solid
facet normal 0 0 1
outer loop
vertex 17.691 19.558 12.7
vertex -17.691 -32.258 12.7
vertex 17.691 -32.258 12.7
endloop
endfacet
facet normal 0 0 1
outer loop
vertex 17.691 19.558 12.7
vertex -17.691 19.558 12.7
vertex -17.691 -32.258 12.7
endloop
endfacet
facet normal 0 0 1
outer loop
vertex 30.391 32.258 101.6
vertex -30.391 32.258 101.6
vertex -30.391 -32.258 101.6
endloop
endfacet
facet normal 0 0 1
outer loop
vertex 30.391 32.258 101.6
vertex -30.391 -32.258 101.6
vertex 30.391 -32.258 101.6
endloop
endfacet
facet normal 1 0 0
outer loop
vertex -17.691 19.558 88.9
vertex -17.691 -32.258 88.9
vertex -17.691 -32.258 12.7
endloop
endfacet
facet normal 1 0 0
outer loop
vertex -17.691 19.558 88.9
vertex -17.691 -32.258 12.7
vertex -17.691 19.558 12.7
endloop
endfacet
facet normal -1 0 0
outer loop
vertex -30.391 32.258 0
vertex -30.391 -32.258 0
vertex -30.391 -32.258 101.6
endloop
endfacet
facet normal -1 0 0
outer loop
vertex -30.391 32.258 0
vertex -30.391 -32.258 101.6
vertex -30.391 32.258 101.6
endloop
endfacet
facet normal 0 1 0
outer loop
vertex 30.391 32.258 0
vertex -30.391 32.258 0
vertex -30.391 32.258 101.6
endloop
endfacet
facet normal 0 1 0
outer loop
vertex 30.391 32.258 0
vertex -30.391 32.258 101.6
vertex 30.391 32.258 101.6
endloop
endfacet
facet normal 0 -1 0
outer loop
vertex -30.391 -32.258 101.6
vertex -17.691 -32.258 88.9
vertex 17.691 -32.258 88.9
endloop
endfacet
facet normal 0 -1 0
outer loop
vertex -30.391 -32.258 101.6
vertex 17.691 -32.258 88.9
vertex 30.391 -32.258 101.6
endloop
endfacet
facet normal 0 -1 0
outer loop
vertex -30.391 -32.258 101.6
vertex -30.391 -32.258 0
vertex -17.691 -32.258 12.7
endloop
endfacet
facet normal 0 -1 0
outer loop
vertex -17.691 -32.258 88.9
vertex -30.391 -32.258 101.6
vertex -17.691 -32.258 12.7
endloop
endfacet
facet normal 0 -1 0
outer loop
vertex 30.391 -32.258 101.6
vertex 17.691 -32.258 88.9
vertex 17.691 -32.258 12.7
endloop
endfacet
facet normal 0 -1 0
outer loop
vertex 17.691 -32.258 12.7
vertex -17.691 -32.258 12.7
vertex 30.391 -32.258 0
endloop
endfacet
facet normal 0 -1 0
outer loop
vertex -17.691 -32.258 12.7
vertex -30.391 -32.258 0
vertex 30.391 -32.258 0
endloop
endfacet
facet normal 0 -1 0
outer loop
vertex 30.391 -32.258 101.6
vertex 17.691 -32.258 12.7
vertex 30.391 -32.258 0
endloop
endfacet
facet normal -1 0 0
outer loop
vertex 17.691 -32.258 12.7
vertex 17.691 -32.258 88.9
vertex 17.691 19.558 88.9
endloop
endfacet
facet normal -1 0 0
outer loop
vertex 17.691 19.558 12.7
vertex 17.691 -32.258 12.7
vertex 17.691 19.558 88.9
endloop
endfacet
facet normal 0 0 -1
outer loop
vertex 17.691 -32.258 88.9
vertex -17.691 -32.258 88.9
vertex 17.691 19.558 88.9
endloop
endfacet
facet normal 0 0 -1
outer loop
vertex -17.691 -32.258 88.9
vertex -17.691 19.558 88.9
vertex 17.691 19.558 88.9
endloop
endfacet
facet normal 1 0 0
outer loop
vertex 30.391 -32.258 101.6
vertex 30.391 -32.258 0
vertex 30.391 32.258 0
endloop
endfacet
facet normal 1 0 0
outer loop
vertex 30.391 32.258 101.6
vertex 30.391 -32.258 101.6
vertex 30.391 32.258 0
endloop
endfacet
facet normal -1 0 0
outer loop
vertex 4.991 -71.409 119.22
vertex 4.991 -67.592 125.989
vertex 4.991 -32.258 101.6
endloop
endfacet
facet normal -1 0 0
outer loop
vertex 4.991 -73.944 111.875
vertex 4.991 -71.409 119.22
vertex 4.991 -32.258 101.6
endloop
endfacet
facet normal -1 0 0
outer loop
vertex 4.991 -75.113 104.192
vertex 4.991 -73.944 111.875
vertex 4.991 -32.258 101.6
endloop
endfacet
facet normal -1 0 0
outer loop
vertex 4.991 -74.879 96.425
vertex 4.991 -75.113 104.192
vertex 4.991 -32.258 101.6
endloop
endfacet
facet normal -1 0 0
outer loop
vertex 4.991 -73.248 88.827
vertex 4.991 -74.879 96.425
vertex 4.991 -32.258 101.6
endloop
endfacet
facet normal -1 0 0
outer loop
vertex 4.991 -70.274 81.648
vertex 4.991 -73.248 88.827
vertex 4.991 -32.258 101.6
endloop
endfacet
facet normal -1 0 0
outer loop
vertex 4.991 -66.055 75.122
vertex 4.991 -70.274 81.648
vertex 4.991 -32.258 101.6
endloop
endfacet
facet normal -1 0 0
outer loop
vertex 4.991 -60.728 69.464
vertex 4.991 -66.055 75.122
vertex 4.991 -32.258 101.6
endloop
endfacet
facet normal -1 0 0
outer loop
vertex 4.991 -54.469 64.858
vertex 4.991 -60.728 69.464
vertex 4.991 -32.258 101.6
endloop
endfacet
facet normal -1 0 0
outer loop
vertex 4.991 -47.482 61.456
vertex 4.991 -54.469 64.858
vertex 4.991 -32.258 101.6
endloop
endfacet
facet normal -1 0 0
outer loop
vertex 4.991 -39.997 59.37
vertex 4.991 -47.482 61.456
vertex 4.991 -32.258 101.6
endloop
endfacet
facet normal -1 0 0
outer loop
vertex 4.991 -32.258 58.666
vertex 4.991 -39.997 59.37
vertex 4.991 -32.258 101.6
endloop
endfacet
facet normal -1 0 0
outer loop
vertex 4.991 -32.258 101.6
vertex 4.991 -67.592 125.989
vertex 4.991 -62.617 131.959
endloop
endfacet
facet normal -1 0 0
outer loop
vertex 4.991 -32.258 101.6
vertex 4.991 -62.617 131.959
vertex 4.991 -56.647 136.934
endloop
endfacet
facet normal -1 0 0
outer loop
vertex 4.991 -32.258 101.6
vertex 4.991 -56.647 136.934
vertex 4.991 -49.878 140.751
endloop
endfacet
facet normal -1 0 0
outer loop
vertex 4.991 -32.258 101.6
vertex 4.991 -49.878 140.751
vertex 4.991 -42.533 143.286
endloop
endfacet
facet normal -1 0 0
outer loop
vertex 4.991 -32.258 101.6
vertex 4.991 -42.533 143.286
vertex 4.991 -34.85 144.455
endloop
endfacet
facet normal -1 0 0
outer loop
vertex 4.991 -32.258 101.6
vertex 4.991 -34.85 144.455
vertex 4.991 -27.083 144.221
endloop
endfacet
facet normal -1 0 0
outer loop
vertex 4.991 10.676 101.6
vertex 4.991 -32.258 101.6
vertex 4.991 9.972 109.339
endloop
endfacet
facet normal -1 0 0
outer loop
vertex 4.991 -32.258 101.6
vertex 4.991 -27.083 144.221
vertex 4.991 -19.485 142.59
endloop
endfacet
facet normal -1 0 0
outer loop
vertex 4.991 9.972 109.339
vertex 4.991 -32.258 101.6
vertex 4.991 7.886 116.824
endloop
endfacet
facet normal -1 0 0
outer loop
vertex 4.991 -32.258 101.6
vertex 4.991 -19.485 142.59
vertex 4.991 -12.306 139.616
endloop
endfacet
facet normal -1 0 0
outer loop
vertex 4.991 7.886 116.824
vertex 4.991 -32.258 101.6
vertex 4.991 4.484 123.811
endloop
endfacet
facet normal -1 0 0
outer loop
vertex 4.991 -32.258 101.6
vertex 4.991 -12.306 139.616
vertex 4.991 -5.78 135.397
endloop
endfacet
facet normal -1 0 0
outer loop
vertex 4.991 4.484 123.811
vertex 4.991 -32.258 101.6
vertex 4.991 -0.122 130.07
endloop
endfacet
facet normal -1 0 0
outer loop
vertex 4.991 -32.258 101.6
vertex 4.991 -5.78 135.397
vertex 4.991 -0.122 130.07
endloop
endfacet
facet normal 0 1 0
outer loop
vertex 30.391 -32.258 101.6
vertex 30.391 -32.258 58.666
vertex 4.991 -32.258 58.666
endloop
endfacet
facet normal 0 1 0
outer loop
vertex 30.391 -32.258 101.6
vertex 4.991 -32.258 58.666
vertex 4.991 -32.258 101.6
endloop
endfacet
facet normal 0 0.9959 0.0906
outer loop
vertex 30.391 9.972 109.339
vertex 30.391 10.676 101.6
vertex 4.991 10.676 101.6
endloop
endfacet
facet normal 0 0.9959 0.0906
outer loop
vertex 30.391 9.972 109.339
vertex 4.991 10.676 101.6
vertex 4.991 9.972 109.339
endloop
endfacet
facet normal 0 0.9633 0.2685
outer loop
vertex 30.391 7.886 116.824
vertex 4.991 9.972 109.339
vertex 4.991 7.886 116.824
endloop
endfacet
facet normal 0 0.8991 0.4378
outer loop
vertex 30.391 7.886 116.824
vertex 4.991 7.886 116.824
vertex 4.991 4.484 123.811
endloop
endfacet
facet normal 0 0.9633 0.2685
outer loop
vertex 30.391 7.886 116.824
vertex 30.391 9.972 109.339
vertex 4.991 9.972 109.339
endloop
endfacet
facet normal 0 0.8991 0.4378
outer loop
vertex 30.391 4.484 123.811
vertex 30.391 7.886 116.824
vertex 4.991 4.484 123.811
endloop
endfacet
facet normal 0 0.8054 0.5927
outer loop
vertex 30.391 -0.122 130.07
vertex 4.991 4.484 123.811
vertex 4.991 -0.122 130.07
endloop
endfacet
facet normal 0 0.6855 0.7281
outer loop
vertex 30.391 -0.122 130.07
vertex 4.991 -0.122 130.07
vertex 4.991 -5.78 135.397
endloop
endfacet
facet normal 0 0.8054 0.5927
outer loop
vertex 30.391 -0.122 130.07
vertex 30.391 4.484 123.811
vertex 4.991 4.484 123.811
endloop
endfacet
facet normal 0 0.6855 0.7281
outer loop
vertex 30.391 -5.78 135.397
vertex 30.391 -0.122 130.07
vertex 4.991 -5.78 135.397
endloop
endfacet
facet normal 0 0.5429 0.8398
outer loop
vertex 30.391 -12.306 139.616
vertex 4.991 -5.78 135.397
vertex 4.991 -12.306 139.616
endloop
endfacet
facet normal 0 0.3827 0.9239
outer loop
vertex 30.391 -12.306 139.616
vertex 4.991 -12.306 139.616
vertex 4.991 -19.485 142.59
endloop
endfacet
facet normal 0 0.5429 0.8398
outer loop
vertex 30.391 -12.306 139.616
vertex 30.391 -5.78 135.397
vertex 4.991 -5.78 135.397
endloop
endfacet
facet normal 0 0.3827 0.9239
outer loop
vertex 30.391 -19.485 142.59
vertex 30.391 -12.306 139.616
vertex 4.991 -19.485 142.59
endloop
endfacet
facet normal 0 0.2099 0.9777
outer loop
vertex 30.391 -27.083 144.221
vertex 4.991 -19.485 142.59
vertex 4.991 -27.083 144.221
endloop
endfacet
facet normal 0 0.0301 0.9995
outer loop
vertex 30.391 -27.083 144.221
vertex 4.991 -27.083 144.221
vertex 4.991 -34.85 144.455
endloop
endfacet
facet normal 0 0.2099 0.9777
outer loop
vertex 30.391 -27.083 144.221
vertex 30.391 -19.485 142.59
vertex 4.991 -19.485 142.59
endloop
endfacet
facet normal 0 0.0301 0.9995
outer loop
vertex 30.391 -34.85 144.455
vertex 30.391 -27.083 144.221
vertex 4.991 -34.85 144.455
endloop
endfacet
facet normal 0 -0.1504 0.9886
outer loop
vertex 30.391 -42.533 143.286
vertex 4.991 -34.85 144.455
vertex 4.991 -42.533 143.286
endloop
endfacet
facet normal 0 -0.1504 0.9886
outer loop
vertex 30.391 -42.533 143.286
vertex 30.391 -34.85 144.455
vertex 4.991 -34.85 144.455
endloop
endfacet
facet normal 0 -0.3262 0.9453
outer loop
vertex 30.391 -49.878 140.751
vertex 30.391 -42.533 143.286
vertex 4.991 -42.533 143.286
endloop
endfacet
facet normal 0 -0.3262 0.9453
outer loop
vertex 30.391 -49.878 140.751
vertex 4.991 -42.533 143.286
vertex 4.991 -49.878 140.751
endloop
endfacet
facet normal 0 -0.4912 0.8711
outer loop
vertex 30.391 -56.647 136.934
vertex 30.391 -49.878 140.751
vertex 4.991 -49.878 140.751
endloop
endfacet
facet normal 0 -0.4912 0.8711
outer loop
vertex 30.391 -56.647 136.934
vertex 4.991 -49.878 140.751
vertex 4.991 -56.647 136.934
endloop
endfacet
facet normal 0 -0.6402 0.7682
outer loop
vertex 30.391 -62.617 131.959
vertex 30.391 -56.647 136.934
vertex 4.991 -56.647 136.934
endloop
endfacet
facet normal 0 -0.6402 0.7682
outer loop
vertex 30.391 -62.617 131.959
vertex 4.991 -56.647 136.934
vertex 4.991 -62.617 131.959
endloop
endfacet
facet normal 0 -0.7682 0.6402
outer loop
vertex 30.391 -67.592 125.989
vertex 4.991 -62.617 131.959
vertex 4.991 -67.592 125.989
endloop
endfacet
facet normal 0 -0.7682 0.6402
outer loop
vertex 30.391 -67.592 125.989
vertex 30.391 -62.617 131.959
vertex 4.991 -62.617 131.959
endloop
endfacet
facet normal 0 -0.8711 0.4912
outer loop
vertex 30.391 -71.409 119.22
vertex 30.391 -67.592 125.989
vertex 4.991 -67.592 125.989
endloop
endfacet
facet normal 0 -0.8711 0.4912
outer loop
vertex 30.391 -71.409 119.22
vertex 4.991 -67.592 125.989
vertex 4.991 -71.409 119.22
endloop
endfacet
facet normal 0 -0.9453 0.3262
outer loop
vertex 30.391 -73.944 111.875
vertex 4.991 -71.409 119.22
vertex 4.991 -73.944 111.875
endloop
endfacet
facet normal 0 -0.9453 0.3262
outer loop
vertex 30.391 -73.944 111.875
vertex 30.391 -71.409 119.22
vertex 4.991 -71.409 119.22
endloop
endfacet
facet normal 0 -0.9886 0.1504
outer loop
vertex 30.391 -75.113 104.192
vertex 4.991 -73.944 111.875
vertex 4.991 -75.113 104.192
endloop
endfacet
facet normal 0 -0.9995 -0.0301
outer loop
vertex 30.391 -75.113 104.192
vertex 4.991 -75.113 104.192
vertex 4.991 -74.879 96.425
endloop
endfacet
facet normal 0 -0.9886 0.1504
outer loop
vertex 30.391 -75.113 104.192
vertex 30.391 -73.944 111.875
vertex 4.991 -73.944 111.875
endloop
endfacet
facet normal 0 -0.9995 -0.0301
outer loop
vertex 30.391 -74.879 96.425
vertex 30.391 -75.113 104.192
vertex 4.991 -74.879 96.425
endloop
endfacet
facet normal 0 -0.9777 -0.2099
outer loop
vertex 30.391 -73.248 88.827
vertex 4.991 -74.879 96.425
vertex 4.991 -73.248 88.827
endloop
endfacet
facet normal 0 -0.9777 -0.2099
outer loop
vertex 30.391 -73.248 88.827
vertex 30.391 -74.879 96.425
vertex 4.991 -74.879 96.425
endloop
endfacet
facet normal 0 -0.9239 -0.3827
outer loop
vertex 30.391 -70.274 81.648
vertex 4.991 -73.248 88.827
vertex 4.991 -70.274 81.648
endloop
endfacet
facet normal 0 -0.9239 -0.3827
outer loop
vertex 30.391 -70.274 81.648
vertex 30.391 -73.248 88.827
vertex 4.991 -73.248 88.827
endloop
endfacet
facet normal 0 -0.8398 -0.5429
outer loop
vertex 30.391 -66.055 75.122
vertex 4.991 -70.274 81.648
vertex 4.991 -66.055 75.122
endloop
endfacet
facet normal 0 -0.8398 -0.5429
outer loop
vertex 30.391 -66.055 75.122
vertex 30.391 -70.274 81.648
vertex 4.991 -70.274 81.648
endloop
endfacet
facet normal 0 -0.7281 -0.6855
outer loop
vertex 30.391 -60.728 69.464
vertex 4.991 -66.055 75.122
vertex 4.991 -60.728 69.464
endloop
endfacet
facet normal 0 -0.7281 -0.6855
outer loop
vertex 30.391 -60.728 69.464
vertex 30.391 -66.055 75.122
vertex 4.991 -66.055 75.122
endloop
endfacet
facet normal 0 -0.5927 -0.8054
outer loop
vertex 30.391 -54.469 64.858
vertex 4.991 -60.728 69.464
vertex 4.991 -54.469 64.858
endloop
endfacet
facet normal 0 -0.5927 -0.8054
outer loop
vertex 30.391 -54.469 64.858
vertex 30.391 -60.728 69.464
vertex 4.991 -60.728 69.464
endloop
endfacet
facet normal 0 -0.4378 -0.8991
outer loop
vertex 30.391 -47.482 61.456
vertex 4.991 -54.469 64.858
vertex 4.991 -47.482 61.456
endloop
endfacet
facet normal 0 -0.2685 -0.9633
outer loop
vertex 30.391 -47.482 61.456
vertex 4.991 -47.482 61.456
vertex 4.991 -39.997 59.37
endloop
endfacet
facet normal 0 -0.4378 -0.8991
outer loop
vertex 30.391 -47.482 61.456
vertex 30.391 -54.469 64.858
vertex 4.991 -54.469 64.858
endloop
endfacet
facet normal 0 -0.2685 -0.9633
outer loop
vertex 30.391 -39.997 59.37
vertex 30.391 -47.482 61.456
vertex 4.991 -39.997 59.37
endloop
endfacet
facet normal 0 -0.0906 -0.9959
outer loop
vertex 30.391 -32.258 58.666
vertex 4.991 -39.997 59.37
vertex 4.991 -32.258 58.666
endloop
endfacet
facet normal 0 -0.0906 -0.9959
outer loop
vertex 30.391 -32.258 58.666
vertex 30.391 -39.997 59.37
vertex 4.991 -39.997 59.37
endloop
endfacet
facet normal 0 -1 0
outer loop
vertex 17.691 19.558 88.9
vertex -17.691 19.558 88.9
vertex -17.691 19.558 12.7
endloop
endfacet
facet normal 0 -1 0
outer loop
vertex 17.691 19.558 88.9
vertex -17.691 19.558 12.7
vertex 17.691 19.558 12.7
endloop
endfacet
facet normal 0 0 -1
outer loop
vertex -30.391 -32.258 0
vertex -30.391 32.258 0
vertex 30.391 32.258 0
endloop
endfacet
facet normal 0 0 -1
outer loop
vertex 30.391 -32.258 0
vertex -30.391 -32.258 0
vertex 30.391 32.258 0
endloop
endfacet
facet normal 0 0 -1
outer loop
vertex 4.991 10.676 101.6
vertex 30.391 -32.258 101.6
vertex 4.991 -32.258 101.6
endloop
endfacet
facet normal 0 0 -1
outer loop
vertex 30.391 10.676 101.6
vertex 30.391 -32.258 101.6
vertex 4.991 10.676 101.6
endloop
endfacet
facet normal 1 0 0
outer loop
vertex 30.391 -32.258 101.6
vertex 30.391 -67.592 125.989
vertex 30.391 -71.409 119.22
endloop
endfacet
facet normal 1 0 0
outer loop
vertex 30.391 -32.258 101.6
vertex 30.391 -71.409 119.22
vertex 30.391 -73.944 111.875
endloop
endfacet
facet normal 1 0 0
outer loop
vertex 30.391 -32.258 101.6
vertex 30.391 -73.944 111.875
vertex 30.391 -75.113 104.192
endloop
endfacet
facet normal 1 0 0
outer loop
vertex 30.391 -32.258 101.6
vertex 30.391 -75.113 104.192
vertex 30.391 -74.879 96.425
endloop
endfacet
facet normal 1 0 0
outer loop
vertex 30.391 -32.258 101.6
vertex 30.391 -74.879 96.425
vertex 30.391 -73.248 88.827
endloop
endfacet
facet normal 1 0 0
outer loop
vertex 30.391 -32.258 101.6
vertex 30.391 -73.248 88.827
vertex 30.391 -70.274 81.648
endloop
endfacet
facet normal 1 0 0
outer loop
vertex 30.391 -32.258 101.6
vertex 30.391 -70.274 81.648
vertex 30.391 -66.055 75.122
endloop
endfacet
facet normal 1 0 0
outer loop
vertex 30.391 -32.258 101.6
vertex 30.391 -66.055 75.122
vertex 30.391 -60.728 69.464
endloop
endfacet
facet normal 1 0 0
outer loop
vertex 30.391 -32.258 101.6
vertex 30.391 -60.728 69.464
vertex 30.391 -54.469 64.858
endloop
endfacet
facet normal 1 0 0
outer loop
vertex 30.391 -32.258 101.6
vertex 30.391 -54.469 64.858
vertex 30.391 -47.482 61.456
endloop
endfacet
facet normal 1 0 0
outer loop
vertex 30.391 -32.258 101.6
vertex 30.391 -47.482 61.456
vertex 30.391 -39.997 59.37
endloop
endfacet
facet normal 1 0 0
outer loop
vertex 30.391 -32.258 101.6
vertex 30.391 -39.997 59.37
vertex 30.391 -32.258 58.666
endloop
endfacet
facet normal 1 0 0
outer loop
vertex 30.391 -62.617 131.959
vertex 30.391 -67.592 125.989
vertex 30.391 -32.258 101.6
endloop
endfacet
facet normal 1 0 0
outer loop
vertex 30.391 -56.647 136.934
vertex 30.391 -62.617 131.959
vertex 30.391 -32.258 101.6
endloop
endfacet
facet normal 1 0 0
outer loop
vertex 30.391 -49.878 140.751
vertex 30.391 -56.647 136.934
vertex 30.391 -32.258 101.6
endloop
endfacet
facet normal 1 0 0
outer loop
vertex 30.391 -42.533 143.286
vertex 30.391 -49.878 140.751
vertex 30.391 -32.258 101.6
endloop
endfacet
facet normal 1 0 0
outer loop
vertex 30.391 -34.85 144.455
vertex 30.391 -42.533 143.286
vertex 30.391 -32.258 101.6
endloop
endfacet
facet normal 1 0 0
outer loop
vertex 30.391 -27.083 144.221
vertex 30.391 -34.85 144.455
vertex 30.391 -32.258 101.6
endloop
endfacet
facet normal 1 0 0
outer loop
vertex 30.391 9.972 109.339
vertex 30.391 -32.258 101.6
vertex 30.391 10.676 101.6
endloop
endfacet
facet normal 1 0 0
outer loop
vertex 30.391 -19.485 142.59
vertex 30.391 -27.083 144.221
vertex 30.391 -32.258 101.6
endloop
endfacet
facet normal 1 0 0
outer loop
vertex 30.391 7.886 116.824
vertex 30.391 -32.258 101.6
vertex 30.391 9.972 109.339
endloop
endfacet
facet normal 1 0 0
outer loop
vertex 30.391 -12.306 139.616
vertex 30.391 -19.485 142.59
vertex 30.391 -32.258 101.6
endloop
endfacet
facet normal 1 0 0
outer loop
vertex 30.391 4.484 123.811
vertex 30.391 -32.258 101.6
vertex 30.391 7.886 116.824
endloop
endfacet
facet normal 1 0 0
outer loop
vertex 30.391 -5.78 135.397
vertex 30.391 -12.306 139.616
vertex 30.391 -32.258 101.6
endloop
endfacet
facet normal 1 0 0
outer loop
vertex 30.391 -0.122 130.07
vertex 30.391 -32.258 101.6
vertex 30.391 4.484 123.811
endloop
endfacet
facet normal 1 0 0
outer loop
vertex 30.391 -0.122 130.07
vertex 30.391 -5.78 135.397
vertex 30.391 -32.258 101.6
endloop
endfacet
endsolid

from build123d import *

# Parameters (mm, degrees)
F0_W     = 60.7822282831
F0_H     = 64.516
F1_DEPTH = 101.6
F2_T     = -12.7
F4_DEPTH = 25.4


with BuildPart() as f1:
    # F0 (on Top) → F1 (new body)
    with BuildSketch(Plane.XY):
        Rectangle(F0_W, F0_H)
    extrude(amount=F1_DEPTH)

    # F2
    f2_openings = [f1.faces().sort_by_distance(p)[0] for p in [
        (0, -32.258, 50.8),
    ]]
    offset(amount=F2_T, openings=f2_openings)


with BuildPart() as f4:
    # F3 (on face) → F4 (new body)
    with BuildSketch(Plane.YZ.offset(30.3911141416)):
        with BuildLine():
            Line((-32.258, 101.6), (10.6755790953, 101.6))
            ThreePointArc((10.6755790953, 101.6), (-62.6166249189, 131.9586249189), (-32.258, 58.6664209047))
            Line((-32.258, 58.6664209047), (-32.258, 101.6))
        make_face()
    extrude(amount=-F4_DEPTH)


solid = Compound([f1.part, f4.part])
